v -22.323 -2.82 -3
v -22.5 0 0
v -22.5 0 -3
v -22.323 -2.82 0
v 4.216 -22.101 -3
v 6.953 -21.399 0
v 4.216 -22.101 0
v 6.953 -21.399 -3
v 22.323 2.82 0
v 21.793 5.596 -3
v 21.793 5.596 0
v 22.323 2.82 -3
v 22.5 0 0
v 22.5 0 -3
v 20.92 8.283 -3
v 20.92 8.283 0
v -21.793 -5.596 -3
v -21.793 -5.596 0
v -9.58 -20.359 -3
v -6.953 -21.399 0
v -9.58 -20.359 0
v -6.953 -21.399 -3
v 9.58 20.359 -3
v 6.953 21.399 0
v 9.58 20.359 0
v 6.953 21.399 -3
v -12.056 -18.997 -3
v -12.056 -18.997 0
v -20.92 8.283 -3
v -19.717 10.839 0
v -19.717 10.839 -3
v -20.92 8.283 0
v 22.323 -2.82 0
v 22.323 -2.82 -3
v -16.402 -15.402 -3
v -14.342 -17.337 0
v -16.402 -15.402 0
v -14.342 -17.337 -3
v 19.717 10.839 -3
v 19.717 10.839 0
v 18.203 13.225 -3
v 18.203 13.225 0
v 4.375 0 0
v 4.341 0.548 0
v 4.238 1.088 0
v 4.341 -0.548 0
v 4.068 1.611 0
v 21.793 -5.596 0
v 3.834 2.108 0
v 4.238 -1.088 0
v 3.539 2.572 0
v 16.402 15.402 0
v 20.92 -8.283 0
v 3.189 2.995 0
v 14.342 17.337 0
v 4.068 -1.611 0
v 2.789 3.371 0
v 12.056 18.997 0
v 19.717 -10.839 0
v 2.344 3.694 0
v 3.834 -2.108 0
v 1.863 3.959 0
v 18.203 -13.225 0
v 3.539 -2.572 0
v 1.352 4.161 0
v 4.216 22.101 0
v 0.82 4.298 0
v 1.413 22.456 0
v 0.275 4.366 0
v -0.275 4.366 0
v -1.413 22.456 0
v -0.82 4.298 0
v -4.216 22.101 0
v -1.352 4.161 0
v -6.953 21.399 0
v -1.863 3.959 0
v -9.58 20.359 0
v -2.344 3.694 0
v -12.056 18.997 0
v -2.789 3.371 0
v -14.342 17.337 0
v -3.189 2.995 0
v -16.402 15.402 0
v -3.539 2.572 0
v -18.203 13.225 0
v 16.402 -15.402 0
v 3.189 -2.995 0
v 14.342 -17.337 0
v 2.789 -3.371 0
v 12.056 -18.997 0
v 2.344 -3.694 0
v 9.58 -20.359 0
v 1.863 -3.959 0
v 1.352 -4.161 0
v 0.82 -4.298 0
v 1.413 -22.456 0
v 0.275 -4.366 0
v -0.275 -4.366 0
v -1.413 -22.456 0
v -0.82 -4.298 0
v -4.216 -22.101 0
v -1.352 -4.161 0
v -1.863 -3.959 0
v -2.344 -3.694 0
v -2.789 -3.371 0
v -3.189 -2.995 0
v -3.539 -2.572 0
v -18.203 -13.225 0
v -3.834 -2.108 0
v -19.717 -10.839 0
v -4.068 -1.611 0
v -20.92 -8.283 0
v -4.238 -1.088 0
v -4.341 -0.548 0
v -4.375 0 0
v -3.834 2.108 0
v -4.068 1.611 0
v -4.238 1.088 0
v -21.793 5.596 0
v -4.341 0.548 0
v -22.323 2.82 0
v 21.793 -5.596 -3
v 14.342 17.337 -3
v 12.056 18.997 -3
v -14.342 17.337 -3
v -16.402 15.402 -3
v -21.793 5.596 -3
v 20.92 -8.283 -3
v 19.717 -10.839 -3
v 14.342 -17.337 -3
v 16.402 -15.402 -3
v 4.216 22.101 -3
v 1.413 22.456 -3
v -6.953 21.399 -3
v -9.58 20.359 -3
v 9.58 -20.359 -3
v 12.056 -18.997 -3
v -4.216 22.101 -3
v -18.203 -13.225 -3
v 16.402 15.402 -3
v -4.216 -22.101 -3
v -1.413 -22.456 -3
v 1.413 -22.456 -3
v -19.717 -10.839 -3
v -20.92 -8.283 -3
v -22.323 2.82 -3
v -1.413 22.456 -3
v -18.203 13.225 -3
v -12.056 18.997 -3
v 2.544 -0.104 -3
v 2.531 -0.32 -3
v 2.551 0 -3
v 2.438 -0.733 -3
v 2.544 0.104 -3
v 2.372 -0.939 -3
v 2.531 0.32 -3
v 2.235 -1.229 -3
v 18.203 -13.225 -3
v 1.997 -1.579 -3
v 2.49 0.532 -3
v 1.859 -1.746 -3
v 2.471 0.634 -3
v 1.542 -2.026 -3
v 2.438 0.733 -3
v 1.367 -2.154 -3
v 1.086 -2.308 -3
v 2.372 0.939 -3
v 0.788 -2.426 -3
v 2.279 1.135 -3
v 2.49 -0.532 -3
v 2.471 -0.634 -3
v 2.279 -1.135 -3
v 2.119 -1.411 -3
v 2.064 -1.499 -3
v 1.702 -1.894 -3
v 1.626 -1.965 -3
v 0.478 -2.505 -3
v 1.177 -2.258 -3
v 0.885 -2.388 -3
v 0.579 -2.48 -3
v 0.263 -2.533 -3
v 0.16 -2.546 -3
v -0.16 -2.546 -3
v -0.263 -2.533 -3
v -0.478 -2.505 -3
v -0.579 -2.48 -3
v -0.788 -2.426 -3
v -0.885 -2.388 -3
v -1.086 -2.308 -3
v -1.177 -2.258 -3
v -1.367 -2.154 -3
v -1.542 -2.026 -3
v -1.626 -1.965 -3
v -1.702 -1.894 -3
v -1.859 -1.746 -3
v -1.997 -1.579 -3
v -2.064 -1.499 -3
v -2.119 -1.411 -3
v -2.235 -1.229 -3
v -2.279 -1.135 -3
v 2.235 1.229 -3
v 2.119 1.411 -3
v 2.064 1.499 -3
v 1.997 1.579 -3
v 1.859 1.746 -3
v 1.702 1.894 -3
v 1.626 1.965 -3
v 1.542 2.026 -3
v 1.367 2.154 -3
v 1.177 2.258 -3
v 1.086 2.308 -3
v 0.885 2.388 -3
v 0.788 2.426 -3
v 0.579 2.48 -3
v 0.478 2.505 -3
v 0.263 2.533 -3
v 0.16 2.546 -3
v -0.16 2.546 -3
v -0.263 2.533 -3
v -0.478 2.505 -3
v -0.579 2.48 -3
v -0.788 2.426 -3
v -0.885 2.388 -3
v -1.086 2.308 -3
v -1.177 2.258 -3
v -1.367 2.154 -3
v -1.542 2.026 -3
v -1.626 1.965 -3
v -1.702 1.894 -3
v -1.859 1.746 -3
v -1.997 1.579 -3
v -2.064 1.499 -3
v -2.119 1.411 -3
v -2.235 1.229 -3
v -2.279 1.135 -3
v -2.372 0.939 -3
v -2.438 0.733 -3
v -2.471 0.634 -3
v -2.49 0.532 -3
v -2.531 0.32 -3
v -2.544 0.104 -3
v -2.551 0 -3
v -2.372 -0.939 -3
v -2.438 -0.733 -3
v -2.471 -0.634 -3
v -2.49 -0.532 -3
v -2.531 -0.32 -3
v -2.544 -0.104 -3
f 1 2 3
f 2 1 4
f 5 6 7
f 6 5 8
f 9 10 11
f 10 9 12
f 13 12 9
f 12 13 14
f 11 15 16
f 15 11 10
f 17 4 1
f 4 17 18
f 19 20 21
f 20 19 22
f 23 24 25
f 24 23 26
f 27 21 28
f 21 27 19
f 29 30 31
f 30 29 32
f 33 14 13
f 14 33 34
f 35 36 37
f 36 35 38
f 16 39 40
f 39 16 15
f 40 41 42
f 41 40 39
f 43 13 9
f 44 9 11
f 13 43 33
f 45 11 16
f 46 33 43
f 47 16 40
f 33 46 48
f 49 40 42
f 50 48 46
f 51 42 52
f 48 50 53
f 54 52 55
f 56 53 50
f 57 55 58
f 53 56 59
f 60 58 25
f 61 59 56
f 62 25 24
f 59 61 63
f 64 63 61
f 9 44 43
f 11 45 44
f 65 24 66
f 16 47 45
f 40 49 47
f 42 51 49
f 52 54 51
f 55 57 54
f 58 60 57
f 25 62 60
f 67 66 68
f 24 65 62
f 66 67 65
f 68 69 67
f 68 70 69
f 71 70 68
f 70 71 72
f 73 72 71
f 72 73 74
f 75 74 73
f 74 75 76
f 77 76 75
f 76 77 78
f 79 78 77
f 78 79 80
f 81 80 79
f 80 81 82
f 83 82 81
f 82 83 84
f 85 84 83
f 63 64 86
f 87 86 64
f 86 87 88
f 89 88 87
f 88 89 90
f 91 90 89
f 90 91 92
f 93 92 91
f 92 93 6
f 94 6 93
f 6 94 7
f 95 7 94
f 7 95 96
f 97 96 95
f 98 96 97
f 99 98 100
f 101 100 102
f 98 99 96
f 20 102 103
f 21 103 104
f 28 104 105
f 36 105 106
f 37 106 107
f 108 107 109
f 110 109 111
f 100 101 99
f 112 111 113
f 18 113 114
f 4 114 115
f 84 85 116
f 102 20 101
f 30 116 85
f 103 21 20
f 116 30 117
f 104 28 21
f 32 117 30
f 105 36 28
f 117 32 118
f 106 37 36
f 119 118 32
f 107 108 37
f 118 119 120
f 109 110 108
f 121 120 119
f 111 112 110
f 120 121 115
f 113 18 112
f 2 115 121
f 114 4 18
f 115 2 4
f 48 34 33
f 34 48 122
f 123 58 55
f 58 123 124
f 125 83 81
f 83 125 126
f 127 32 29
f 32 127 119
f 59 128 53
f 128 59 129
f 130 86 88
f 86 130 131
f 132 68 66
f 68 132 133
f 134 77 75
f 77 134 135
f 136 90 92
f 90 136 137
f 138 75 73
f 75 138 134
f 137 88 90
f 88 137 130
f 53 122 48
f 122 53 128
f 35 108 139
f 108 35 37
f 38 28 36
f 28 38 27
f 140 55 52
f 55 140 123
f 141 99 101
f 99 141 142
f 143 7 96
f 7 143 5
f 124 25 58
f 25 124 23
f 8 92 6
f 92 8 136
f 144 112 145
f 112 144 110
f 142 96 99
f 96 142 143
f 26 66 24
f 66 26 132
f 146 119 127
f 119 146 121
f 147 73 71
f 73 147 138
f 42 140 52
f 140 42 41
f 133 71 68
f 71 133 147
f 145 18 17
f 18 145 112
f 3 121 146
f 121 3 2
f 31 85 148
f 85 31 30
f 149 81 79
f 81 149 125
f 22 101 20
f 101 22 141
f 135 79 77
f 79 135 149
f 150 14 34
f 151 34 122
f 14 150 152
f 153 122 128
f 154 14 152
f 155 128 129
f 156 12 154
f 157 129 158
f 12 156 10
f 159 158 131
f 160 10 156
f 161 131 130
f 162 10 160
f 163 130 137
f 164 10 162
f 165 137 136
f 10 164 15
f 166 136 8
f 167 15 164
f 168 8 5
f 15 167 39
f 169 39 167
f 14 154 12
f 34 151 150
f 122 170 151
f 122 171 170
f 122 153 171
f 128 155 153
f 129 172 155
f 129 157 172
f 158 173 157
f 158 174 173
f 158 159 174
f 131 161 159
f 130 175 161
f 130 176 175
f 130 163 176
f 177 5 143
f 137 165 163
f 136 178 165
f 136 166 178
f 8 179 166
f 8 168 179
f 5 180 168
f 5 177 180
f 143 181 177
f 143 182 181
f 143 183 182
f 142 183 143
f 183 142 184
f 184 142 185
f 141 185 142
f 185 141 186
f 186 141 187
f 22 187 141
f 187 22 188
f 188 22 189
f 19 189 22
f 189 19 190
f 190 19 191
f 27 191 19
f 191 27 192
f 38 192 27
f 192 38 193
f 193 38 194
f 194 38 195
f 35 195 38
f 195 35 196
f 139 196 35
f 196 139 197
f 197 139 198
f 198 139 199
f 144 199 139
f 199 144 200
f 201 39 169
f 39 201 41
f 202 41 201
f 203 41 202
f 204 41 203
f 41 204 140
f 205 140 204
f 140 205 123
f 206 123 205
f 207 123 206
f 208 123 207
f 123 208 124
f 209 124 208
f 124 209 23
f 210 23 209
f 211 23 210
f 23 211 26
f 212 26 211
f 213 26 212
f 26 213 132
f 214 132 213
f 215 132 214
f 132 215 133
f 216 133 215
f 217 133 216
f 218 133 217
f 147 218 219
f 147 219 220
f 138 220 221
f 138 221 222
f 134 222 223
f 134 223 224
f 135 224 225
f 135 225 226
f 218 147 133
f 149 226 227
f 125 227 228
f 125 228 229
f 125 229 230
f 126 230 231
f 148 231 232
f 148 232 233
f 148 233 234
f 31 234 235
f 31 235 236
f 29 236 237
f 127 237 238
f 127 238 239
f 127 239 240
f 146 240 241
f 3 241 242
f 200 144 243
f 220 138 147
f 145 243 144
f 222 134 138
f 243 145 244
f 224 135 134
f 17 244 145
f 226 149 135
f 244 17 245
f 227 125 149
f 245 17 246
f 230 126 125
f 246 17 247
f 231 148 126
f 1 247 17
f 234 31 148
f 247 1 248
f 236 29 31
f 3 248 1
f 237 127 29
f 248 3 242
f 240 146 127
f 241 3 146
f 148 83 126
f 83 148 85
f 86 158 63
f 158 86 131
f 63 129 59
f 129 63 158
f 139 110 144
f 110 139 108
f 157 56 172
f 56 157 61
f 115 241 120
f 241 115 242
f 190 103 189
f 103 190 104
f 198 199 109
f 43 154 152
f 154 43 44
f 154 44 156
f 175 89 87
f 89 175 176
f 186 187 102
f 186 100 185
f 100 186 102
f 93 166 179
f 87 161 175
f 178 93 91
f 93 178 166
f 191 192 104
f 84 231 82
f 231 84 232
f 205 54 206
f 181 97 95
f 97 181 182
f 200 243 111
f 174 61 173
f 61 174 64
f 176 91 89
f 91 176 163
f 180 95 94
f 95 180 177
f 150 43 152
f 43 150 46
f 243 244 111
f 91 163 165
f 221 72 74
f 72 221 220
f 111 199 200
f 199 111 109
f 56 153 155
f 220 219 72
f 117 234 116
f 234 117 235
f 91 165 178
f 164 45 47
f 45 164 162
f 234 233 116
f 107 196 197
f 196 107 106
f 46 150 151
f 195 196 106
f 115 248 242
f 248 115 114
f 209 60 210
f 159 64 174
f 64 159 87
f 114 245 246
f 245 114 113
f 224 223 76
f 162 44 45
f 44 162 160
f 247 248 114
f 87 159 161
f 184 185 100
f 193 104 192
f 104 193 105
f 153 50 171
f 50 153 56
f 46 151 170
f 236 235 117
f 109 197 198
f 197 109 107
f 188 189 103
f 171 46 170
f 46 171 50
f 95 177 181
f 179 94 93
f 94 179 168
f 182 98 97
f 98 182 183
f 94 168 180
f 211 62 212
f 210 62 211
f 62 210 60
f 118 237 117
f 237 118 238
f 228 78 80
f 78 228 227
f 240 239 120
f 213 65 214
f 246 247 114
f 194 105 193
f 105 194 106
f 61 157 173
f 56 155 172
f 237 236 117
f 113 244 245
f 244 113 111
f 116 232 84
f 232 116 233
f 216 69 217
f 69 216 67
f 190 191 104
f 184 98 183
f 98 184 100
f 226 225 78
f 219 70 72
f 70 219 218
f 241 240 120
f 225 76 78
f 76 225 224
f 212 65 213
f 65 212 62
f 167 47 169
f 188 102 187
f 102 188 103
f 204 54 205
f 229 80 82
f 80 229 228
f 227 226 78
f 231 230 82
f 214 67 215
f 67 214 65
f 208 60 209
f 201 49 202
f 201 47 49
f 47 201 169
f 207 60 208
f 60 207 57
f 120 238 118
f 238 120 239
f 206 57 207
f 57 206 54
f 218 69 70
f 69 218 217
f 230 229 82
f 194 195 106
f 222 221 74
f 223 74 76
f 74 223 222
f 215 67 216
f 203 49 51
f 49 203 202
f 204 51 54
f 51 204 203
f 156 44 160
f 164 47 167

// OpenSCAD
$fn = 50;


difference() {
	union() {
		translate(v = [0, 0, -3.0000000000]) {
			cylinder(h = 3, r = 22.5000000000);
		}
		translate(v = [0, 0, -3.0000000000]) {
			cylinder(h = 3, r = 2.8750000000);
		}
	}
	union() {
		translate(v = [0, 0, 0]) {
			rotate(a = [0, 0, 0]) {
				difference() {
					union() {
						translate(v = [0, 0, -3.0000000000]) {
							cylinder(h = 3, r = 2.0000000000);
						}
						translate(v = [0, 0, -3.7000000000]) {
							cylinder(h = 3.7000000000, r1 = 2.1250000000, r2 = 4.3750000000);
						}
						translate(v = [0, 0, -3.0000000000]) {
							cylinder(h = 3, r = 2.1250000000);
						}
						translate(v = [0, 0, -3.0000000000]) {
							cylinder(h = 3, r = 2.0000000000);
						}
					}
					union();
				}
			}
		}
	}
}
